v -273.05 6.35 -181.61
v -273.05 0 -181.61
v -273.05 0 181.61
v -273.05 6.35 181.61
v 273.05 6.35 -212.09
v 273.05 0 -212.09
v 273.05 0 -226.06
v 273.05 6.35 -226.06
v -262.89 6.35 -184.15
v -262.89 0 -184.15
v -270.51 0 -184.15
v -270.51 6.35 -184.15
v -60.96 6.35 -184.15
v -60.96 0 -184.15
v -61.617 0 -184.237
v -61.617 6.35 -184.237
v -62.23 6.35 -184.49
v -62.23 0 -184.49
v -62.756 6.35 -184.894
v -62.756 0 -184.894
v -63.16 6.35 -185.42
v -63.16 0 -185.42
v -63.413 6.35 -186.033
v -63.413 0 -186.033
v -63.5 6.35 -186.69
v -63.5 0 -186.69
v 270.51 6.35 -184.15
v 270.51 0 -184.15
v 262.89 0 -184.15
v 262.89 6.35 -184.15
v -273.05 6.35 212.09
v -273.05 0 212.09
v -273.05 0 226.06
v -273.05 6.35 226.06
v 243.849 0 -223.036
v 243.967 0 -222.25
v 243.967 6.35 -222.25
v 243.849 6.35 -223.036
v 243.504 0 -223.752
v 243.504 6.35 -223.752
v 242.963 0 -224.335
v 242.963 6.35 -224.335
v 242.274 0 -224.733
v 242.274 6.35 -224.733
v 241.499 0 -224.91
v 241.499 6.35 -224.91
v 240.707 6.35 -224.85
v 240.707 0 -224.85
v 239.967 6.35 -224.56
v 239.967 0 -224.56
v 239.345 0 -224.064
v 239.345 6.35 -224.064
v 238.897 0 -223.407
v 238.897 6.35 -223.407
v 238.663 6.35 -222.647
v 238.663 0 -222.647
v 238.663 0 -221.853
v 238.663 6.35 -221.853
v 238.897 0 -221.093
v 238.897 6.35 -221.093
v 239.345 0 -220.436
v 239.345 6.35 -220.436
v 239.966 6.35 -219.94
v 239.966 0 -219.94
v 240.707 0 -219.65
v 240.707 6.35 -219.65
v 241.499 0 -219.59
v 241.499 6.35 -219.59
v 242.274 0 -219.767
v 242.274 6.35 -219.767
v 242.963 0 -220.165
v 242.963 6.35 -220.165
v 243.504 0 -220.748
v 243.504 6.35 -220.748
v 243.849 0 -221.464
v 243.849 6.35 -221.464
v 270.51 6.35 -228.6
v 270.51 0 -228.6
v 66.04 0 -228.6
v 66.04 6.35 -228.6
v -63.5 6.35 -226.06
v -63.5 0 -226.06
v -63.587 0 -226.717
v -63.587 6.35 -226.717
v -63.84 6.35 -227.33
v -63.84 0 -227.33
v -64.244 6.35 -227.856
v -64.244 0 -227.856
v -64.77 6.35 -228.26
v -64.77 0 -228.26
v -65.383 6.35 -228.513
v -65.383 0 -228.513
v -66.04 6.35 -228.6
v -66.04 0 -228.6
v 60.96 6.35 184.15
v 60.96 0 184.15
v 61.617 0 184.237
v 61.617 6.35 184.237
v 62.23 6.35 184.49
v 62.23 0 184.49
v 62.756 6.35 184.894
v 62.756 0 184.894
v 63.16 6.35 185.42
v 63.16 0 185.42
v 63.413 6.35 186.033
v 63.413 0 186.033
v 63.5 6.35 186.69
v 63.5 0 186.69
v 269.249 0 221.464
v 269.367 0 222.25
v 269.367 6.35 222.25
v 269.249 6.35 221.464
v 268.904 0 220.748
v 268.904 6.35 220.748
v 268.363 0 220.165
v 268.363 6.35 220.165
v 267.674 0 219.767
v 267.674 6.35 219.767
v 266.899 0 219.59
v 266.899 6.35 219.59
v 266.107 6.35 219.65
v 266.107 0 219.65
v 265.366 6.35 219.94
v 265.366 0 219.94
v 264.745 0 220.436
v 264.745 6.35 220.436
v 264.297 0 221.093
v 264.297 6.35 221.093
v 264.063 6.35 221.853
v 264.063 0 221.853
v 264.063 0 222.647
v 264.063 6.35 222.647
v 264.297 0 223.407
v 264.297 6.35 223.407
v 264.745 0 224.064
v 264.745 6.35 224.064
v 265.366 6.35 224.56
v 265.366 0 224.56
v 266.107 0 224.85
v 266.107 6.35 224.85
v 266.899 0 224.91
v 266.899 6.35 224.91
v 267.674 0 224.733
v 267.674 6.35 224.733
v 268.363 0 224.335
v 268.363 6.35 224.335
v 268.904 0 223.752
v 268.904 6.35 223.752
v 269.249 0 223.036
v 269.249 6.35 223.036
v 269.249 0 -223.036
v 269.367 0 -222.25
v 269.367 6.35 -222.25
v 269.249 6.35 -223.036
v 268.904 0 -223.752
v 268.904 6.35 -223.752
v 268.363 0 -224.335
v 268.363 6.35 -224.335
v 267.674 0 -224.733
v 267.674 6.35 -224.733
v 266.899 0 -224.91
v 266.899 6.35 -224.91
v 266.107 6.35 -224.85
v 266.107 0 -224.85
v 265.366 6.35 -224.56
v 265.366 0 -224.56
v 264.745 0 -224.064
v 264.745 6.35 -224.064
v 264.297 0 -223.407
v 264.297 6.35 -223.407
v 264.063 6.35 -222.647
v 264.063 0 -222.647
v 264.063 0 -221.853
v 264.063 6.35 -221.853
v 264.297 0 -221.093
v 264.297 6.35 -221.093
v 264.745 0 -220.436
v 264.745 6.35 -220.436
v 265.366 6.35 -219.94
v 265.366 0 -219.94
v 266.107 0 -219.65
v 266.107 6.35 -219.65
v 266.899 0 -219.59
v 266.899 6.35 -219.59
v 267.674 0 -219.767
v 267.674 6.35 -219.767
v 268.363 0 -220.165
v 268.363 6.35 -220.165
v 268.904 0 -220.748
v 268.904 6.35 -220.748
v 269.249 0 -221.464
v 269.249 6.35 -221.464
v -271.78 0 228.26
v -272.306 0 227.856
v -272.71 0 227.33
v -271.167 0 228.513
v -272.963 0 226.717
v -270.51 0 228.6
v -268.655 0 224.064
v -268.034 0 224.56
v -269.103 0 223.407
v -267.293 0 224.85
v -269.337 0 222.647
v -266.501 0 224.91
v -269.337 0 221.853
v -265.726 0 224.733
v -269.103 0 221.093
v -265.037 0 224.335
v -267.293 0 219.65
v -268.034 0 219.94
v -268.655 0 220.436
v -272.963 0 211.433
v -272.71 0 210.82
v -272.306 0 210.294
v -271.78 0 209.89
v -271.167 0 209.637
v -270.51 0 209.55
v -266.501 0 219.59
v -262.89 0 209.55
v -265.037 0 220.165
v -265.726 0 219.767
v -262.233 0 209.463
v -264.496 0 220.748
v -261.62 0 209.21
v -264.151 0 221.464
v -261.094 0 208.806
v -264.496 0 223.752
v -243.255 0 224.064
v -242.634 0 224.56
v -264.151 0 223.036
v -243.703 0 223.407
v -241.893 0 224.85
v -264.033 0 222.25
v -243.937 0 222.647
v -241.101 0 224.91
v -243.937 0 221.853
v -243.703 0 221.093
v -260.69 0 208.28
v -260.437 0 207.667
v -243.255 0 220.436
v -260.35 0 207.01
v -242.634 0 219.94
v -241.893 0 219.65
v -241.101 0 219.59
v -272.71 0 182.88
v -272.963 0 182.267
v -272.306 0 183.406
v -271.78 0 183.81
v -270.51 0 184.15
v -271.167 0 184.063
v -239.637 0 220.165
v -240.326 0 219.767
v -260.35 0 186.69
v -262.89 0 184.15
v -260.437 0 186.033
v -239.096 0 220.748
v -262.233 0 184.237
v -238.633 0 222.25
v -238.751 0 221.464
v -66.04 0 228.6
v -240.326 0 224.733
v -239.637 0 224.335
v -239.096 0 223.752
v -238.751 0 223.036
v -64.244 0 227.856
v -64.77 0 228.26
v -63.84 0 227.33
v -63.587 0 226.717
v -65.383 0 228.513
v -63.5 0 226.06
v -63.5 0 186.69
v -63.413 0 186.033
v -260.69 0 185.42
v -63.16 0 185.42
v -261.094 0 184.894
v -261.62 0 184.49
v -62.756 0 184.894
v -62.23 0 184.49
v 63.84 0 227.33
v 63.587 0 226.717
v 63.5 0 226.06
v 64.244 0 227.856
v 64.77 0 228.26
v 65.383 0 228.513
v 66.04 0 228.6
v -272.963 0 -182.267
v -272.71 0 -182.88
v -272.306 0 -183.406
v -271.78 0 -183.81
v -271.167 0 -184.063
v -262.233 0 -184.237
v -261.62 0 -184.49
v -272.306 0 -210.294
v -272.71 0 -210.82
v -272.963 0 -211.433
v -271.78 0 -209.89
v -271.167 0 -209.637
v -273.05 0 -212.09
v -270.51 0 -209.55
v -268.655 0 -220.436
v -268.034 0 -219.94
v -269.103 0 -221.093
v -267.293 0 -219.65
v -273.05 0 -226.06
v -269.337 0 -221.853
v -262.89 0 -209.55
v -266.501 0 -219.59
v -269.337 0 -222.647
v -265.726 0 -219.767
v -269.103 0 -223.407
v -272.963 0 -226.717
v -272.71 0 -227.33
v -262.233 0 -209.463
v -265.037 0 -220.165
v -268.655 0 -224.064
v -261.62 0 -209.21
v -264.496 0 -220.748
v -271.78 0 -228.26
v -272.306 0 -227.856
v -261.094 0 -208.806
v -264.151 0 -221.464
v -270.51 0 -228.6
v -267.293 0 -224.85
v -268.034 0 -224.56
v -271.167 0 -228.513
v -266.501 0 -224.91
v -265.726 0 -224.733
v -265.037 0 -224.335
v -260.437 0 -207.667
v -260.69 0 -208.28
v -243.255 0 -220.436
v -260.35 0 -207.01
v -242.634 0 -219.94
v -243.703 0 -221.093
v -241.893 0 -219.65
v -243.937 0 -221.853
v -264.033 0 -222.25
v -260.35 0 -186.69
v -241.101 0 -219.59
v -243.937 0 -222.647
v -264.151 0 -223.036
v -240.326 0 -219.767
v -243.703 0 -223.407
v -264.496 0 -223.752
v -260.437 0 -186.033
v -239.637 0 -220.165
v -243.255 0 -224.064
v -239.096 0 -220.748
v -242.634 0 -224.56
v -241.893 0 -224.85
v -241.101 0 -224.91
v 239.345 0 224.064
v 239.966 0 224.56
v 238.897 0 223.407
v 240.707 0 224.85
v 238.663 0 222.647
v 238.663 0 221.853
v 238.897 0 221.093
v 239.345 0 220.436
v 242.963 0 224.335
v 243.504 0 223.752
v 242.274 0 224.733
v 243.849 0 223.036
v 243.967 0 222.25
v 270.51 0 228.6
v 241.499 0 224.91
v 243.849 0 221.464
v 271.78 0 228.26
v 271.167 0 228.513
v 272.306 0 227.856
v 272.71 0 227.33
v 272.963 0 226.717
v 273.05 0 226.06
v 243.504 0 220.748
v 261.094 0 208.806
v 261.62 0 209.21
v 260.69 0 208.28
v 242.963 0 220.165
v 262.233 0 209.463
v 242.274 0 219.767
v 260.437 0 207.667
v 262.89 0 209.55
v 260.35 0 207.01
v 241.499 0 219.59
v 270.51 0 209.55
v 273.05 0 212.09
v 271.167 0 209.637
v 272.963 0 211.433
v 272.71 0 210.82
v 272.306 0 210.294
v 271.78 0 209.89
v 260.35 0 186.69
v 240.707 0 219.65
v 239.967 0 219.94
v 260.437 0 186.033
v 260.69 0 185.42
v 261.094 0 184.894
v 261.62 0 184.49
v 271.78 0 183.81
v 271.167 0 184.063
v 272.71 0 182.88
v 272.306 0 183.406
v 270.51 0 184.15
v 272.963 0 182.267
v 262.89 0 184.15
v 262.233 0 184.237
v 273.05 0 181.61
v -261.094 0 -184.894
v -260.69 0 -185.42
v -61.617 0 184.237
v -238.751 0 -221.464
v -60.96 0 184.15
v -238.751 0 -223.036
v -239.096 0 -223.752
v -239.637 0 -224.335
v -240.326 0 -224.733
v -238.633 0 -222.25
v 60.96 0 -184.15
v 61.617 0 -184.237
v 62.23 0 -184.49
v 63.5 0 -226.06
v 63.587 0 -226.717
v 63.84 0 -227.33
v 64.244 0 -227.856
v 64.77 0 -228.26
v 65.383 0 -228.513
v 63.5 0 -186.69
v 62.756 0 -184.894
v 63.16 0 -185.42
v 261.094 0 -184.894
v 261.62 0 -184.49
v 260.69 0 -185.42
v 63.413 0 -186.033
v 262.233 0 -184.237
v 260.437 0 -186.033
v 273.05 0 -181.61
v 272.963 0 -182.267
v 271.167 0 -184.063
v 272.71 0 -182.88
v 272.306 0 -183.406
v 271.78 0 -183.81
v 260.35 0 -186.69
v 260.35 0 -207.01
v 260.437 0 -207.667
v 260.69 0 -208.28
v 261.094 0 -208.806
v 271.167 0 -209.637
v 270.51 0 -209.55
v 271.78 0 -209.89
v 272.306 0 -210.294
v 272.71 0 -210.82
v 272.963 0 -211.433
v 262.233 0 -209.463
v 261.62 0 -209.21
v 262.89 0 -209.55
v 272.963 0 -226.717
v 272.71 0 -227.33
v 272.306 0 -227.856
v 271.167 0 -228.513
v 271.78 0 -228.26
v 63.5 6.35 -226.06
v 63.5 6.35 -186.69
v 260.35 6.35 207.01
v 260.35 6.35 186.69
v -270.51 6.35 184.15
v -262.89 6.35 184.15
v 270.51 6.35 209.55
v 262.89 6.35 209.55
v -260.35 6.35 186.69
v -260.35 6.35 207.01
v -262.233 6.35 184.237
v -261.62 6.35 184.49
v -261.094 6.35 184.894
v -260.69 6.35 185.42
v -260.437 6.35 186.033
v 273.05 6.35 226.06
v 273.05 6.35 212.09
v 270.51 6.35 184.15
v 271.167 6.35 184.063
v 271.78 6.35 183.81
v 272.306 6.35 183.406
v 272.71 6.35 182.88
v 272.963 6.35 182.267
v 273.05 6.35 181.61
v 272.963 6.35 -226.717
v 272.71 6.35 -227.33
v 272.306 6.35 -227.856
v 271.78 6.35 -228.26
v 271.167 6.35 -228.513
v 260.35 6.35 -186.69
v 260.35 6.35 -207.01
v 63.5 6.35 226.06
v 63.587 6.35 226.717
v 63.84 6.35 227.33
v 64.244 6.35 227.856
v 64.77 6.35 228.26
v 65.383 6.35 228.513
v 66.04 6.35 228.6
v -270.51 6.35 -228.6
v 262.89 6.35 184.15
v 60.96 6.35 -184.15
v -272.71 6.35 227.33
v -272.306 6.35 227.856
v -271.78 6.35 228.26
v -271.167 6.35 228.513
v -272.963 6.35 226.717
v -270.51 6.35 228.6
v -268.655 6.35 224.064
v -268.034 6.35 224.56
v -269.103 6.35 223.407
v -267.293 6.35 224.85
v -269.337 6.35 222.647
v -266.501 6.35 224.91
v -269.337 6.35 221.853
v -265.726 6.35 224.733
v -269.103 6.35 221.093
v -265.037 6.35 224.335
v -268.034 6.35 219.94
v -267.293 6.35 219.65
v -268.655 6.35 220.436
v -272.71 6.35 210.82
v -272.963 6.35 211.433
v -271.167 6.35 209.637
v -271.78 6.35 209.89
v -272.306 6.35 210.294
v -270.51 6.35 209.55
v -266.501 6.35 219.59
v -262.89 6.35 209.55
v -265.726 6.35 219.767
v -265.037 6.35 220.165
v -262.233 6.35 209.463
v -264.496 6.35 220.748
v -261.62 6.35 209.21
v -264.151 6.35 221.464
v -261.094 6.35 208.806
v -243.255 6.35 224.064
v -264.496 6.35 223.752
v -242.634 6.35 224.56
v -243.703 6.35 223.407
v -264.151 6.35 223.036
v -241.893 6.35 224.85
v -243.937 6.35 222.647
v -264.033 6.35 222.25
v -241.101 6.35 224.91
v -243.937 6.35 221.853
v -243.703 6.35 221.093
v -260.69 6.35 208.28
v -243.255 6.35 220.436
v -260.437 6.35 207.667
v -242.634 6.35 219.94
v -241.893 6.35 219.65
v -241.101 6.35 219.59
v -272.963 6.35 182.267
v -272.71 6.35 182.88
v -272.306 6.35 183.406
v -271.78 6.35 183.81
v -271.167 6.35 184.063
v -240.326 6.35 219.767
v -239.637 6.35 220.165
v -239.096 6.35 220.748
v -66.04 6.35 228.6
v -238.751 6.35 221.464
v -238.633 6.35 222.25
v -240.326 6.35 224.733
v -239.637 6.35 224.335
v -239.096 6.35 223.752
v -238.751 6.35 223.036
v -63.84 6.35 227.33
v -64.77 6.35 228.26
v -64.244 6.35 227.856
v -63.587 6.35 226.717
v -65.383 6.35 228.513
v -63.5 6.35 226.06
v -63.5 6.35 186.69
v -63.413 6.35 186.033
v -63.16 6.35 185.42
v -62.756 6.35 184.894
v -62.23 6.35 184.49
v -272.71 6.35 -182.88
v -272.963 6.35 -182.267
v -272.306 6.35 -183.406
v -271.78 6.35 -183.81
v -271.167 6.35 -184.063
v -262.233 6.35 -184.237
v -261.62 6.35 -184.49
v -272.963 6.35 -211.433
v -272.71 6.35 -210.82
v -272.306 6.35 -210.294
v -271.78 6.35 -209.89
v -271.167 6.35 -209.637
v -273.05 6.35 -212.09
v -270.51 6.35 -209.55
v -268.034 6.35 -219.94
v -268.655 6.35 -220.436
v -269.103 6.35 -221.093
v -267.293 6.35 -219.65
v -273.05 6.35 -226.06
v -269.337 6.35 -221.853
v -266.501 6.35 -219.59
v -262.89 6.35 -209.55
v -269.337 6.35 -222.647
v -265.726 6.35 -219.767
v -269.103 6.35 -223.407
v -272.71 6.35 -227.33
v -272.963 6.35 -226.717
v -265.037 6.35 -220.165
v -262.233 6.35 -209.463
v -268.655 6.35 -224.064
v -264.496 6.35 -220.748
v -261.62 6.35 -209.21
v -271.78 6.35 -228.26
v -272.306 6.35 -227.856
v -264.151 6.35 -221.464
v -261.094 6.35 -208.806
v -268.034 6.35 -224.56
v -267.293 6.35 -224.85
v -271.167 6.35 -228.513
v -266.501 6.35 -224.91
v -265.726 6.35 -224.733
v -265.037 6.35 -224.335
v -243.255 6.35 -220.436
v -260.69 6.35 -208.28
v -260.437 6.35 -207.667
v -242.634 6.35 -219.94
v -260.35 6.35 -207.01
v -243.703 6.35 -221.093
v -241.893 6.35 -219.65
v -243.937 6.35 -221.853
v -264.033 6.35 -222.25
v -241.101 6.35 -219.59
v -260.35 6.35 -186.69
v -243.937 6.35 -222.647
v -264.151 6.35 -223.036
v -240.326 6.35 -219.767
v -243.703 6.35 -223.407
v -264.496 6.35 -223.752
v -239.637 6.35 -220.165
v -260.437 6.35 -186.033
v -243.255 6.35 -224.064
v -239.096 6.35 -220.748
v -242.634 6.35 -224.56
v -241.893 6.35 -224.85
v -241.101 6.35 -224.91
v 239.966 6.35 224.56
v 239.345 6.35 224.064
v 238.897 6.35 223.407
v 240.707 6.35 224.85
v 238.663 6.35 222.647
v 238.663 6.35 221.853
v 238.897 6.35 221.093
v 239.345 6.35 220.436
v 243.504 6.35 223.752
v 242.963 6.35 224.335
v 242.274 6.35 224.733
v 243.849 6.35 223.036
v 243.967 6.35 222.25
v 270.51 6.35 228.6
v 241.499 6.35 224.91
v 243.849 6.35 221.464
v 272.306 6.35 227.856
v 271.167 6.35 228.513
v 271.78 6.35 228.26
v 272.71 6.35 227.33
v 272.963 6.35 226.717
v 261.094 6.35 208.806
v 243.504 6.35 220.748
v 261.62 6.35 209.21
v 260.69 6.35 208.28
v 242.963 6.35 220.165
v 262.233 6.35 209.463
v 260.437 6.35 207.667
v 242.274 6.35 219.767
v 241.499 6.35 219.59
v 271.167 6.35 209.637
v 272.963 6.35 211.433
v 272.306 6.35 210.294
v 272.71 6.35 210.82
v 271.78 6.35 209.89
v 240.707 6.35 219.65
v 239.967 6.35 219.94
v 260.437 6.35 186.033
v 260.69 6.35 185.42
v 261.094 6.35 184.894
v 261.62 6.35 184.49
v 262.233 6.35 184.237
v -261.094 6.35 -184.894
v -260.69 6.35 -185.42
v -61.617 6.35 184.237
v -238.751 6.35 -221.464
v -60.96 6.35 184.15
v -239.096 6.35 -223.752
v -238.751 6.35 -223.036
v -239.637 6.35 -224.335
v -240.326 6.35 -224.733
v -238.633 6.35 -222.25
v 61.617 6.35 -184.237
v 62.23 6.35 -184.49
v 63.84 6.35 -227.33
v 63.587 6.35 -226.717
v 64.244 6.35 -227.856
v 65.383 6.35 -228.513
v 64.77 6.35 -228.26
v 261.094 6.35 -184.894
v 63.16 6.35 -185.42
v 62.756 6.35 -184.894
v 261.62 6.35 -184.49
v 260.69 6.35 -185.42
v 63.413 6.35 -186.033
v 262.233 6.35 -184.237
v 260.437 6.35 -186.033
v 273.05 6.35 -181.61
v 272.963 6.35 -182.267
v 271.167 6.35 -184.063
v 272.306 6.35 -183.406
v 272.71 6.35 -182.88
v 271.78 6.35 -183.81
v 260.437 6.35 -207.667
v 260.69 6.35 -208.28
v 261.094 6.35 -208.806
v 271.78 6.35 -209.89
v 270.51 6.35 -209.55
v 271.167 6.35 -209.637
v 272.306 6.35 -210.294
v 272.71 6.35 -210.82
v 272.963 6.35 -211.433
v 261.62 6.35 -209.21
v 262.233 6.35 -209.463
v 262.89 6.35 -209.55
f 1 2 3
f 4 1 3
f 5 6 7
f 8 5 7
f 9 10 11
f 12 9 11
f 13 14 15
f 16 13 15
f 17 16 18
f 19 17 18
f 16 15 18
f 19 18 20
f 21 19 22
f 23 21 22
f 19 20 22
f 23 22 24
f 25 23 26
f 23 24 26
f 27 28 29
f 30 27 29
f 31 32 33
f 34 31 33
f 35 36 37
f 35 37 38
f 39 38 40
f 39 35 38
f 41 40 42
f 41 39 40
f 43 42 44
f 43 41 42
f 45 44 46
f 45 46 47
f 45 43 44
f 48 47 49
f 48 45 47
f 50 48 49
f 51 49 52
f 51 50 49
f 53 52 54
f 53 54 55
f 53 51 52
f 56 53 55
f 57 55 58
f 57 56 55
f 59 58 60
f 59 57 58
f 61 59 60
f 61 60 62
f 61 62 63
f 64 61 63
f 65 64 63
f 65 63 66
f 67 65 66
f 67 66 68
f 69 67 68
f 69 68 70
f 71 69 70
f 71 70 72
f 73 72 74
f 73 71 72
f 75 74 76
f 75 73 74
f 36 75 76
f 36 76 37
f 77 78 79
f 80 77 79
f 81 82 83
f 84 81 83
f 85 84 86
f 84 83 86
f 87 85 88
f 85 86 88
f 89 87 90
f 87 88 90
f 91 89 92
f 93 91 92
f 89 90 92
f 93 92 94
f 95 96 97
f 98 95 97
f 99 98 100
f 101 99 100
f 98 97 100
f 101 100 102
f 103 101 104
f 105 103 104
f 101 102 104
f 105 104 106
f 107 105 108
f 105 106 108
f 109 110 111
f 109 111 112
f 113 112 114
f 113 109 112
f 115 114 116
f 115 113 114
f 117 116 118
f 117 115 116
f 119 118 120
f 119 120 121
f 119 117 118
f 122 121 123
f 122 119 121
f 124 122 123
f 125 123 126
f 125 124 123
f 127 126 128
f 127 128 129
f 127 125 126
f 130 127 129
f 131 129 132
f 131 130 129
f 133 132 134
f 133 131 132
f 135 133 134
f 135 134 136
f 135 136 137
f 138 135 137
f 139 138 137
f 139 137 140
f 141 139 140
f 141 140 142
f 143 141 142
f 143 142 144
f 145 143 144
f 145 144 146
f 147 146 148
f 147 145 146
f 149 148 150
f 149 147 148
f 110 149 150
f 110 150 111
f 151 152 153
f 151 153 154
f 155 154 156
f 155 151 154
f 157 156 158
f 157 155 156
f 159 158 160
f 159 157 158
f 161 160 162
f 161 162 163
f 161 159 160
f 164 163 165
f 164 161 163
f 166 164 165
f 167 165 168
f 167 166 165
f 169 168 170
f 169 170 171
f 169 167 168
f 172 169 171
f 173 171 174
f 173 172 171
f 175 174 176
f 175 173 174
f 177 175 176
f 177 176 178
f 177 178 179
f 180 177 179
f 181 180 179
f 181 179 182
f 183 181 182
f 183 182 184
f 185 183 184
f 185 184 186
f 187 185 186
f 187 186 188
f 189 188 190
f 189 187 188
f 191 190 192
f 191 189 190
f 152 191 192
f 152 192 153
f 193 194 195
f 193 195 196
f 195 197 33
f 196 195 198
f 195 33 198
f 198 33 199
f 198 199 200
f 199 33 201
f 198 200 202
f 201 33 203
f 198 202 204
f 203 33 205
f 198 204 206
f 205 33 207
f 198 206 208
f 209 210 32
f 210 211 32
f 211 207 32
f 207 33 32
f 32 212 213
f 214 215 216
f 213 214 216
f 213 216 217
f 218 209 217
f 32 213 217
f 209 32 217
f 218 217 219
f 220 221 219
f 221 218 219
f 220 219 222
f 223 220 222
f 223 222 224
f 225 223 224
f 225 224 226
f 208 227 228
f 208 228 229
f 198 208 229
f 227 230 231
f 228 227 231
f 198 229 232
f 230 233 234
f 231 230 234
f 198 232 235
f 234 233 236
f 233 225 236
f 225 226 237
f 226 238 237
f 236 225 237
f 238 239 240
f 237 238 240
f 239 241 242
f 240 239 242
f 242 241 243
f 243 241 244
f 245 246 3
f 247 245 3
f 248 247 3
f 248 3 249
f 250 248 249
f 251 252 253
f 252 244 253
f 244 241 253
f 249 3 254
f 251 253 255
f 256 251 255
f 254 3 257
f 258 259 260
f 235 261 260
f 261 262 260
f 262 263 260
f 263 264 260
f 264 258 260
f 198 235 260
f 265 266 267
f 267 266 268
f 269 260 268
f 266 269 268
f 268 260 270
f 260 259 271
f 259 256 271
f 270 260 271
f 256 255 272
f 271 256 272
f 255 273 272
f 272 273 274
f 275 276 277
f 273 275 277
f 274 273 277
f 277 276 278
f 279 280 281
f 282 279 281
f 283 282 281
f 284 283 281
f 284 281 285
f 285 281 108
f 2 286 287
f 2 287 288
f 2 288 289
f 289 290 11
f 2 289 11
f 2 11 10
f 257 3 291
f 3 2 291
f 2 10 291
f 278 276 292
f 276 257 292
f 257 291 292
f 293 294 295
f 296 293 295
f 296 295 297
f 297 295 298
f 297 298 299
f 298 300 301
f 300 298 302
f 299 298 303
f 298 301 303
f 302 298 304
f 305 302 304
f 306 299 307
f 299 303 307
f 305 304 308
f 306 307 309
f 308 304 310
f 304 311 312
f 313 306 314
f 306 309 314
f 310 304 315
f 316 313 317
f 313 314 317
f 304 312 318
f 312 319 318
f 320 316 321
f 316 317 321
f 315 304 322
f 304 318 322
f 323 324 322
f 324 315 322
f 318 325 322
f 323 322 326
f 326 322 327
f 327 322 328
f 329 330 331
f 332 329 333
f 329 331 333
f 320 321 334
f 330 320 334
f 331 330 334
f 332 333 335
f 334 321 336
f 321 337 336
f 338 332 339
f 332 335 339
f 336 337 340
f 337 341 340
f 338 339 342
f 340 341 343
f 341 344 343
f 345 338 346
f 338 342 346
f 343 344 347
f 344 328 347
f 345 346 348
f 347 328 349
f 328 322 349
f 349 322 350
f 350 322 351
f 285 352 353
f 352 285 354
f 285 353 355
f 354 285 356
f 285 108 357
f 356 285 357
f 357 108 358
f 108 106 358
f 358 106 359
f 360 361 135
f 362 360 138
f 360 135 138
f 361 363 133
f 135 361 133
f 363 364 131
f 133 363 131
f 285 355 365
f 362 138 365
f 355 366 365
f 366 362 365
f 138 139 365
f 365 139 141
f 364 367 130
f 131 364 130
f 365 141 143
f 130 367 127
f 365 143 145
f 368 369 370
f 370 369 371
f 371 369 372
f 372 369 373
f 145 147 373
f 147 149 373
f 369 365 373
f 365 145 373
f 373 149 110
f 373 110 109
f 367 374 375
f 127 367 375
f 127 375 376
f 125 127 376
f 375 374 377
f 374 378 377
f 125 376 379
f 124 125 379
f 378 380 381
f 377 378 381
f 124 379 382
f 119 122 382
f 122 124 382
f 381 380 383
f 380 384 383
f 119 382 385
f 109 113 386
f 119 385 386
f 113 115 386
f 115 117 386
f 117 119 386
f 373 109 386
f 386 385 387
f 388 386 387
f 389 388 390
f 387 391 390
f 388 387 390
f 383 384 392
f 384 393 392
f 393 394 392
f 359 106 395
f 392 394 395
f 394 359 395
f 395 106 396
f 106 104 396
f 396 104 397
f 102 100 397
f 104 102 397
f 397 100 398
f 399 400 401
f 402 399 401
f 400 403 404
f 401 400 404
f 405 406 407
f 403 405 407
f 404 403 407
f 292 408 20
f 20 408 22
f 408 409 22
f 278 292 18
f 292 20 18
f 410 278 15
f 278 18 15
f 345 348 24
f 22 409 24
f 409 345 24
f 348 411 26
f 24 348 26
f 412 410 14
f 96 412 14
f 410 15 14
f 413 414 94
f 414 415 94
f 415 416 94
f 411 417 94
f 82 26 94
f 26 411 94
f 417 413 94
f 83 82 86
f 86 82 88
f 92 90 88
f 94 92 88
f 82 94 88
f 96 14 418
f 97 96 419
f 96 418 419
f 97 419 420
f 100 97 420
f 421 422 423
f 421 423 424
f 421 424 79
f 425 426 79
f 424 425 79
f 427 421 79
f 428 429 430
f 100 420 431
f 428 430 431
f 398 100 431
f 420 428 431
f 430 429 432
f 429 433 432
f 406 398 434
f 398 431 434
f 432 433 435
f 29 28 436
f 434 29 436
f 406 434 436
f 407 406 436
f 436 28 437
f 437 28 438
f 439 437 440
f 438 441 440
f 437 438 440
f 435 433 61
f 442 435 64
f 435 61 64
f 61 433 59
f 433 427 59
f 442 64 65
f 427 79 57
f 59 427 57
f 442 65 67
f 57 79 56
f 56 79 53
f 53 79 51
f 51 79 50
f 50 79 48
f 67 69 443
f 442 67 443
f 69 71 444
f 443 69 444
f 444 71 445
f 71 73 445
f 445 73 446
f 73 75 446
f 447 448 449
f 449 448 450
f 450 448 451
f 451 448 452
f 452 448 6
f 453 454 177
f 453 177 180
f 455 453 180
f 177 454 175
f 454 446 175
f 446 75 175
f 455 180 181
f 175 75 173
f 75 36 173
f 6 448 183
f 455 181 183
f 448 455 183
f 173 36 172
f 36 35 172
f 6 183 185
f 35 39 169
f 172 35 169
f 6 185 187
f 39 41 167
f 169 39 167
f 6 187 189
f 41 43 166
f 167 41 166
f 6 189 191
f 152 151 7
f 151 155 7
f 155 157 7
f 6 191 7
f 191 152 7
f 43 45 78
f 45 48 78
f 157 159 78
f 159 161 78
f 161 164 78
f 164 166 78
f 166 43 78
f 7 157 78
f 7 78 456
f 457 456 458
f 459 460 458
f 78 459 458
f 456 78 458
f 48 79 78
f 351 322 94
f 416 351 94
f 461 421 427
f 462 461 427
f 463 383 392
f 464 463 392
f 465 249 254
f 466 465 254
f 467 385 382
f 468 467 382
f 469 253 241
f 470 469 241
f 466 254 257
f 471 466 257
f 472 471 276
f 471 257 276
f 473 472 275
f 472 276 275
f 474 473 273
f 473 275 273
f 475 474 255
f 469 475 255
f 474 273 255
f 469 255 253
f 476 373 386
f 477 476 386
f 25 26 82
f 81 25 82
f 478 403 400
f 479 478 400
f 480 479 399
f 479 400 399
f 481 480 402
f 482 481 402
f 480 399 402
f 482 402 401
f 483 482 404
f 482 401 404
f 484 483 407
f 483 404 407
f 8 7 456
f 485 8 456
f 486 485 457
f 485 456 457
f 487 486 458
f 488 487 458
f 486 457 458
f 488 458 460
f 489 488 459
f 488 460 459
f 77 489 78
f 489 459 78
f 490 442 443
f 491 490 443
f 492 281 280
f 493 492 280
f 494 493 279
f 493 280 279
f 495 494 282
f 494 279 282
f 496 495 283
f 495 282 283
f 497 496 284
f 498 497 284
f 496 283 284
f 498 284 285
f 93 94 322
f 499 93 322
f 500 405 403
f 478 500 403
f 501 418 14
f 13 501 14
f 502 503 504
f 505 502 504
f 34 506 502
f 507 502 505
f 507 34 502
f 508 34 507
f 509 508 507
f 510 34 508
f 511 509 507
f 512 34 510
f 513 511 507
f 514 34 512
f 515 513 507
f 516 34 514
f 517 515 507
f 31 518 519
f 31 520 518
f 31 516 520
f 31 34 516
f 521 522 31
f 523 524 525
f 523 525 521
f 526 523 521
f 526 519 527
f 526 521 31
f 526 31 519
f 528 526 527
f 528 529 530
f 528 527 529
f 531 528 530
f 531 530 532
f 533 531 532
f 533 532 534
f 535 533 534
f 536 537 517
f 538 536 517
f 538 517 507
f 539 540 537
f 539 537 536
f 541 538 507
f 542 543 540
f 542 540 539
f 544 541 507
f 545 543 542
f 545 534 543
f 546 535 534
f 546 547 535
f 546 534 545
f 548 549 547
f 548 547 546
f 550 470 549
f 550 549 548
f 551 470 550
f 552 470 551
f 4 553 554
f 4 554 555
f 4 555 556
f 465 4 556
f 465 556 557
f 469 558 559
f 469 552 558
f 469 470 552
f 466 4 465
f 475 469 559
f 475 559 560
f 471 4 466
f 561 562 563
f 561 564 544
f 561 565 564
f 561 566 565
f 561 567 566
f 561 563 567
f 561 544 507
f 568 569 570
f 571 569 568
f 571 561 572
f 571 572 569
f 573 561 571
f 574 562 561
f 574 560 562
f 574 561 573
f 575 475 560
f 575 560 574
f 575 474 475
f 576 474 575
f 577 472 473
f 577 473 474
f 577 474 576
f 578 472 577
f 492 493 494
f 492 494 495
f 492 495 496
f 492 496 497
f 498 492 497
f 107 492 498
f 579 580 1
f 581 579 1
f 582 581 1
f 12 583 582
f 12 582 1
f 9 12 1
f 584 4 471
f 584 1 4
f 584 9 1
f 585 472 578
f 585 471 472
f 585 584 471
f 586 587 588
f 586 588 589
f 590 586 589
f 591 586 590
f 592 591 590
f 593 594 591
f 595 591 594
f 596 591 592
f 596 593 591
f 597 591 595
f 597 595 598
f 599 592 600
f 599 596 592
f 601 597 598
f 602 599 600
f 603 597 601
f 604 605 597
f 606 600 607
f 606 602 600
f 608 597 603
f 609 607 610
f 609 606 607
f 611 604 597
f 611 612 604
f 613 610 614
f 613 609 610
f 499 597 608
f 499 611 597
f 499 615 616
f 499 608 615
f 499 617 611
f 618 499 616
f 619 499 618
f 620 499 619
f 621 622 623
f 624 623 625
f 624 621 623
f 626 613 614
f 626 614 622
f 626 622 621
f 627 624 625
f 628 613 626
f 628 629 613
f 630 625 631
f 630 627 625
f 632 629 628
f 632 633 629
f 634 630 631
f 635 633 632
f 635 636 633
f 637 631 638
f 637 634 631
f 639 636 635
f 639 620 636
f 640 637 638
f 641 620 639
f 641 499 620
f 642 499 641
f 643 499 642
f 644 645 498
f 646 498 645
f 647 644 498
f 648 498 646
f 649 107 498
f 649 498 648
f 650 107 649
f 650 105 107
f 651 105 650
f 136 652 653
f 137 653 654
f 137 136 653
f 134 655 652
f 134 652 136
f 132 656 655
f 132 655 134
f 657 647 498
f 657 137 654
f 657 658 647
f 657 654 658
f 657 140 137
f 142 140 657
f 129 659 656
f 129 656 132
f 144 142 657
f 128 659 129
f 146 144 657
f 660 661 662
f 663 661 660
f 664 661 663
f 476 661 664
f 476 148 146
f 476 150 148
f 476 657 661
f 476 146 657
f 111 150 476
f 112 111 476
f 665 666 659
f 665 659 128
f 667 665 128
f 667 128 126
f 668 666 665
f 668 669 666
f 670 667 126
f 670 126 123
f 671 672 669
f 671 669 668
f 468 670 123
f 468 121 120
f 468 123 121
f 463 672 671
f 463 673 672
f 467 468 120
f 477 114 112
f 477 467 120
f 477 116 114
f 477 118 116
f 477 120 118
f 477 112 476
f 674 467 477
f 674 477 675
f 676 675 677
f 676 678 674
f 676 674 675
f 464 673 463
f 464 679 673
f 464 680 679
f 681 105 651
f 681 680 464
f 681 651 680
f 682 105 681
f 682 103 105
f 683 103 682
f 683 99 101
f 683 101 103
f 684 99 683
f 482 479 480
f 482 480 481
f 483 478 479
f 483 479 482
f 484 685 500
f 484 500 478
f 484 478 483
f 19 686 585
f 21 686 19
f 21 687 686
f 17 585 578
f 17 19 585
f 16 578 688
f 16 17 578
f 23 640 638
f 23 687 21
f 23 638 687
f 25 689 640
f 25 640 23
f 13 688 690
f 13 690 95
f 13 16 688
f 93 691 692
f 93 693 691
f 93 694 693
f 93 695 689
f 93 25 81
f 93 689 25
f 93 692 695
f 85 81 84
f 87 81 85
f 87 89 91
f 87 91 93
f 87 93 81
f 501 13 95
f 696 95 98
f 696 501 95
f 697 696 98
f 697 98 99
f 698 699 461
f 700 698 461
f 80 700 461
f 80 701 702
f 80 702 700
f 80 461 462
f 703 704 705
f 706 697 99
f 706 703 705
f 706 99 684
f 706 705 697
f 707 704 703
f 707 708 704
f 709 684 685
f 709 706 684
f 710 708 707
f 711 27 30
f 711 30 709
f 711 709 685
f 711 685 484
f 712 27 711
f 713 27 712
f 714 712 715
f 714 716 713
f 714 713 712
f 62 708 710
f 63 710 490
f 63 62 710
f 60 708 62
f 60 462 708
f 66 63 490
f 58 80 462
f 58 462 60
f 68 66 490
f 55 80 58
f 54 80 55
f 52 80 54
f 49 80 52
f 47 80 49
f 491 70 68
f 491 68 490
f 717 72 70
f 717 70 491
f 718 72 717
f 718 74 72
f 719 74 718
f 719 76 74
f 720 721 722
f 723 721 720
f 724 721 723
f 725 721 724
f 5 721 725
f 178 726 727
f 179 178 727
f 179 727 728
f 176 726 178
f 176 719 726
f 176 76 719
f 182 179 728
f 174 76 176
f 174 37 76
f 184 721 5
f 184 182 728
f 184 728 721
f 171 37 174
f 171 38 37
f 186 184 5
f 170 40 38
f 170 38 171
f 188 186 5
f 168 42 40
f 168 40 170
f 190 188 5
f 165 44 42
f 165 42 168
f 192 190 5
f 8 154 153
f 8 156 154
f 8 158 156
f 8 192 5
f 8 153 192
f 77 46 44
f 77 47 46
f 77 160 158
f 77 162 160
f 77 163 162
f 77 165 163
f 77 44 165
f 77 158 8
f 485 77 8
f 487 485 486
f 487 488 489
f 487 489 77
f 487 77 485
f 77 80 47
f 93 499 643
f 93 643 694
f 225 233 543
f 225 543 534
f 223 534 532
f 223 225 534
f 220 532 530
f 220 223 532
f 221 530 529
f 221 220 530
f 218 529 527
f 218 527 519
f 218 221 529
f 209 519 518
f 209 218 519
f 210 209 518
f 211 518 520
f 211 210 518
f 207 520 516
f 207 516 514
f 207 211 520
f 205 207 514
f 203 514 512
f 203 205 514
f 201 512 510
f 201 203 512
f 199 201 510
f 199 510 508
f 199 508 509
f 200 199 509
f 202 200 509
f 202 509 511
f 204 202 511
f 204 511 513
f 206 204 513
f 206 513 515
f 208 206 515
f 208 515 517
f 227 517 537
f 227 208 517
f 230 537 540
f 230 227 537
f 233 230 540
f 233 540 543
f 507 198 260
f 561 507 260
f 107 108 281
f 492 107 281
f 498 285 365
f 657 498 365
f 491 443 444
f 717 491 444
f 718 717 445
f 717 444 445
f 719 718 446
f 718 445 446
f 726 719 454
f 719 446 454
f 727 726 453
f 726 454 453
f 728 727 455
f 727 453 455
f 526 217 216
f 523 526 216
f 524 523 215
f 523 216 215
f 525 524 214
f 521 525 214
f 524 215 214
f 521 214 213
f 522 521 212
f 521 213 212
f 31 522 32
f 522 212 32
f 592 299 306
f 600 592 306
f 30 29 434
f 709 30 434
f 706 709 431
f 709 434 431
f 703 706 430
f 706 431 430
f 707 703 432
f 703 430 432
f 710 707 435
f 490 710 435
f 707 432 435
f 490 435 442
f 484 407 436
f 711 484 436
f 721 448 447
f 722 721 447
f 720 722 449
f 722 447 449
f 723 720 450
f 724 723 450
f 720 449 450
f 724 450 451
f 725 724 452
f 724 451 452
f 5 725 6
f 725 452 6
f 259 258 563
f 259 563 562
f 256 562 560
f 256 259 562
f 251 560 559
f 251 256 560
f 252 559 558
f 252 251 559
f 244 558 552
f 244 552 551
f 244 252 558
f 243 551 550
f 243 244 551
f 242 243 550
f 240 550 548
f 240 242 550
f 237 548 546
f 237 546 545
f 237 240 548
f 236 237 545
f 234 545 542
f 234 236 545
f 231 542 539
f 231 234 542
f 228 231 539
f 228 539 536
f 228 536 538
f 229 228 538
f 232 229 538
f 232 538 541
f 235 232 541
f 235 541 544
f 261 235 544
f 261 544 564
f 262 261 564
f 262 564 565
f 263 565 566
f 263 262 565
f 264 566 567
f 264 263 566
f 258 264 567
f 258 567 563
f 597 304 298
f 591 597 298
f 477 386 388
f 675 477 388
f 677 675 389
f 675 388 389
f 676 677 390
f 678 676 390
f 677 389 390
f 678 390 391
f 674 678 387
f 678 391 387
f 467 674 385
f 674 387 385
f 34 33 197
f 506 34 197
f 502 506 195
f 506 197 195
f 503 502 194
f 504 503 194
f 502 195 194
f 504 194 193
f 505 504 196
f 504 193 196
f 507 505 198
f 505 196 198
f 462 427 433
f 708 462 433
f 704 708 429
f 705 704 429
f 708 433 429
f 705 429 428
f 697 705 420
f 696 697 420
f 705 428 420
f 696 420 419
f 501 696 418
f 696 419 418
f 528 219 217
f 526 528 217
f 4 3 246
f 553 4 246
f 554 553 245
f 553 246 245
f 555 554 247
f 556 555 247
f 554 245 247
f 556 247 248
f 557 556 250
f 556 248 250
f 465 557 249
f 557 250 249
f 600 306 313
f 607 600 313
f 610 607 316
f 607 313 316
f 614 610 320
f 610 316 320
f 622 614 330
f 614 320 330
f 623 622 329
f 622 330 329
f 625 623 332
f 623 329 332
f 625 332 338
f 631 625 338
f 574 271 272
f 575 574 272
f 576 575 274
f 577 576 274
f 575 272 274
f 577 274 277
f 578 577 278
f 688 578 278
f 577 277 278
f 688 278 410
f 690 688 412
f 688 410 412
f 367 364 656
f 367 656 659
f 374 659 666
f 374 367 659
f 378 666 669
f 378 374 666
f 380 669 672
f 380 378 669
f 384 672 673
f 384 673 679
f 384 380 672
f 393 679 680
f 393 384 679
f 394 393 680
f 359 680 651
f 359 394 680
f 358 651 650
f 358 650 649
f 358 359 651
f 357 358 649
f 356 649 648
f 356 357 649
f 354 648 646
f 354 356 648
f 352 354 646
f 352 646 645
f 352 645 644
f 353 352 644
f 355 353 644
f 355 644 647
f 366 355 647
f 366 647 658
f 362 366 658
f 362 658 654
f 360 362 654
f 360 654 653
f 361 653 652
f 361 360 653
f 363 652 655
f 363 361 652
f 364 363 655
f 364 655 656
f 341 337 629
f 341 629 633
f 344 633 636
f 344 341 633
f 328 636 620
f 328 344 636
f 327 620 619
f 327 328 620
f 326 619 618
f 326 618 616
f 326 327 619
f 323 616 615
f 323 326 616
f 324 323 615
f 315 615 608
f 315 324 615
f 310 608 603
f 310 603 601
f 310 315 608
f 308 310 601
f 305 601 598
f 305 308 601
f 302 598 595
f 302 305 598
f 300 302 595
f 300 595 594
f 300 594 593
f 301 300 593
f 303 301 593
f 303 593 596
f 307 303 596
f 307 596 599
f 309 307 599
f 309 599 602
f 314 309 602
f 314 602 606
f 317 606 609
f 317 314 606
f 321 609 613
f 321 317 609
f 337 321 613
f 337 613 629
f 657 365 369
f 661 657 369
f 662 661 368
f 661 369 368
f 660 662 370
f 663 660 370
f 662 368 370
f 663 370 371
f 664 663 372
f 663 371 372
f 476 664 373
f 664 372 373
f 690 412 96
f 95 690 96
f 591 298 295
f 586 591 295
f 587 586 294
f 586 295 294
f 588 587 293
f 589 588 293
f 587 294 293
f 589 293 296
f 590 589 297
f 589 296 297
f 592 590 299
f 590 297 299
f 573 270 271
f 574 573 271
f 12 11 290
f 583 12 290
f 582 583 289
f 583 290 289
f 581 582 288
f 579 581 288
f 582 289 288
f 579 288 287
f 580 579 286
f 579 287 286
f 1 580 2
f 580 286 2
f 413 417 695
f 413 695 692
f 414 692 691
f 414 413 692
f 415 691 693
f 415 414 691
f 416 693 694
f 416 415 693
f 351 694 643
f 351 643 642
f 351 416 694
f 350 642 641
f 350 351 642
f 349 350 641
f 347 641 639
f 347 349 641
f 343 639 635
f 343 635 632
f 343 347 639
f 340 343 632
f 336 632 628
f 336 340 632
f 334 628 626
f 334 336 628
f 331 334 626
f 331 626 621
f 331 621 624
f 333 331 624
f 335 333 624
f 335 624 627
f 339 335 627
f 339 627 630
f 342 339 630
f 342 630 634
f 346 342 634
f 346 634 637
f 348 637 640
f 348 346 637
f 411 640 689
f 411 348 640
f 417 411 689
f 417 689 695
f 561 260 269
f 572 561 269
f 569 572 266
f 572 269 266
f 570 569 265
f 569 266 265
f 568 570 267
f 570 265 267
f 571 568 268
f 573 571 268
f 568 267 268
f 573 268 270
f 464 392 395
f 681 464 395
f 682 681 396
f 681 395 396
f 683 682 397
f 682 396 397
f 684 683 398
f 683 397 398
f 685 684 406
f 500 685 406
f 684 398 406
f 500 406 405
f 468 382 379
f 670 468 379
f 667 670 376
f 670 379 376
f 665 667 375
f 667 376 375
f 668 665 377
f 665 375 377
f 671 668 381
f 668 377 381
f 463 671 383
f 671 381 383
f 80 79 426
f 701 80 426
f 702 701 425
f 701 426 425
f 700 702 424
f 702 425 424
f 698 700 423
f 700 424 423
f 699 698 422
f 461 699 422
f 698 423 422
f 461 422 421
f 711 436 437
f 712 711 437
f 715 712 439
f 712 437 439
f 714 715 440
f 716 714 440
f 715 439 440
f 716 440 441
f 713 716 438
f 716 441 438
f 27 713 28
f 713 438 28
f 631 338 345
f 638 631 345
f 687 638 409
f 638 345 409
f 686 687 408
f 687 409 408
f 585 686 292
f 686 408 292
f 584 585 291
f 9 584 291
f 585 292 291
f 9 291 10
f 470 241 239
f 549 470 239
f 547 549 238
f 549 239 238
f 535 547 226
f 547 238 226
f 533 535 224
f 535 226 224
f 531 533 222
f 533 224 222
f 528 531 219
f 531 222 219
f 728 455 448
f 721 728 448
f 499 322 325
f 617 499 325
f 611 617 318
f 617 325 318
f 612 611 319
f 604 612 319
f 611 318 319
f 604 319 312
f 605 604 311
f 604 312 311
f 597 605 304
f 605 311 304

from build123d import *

# Parameters (mm, degrees)
SKETCH1_R           = 2.667
BOSS_EXTRUDE1_DEPTH = 6.35


with BuildPart() as part:
    # Sketch1 → Boss-Extrude1 (new body)
    with BuildSketch(Plane(origin=(0, 0, 0), x_dir=(1, 0, 0), z_dir=(0, 1, 0))):
        with BuildLine():
            Line((-273.05, 226.06), (-273.05, 212.09))
            ThreePointArc((-273.05, 212.09), (-272.306051224, 210.293948776), (-270.51, 209.55))
            Line((-270.51, 209.55), (-262.89, 209.55))
            ThreePointArc((-262.89, 209.55), (-261.093948776, 208.806051224), (-260.35, 207.01))
            Line((-260.35, 207.01), (-260.35, 186.69))
            ThreePointArc((-260.35, 186.69), (-261.093948776, 184.893948776), (-262.89, 184.15))
            Line((-262.89, 184.15), (-270.51, 184.15))
            ThreePointArc((-270.51, 184.15), (-272.306051224, 183.406051224), (-273.05, 181.61))
            Line((-273.05, 181.61), (-273.05, -181.61))
            ThreePointArc((-273.05, -181.61), (-272.306051224, -183.406051224), (-270.51, -184.15))
            Line((-270.51, -184.15), (-262.89, -184.15))
            ThreePointArc((-262.89, -184.15), (-261.093948776, -184.893948776), (-260.35, -186.69))
            Line((-260.35, -186.69), (-260.35, -207.01))
            ThreePointArc((-260.35, -207.01), (-261.093948776, -208.806051224), (-262.89, -209.55))
            Line((-262.89, -209.55), (-270.51, -209.55))
            ThreePointArc((-270.51, -209.55), (-272.306051224, -210.293948776), (-273.05, -212.09))
            Line((-273.05, -212.09), (-273.05, -226.06))
            ThreePointArc((-273.05, -226.06), (-272.306051224, -227.856051224), (-270.51, -228.6))
            Line((-270.51, -228.6), (-66.04, -228.6))
            ThreePointArc((-66.04, -228.6), (-64.243948776, -227.856051224), (-63.5, -226.06))
            Line((-63.5, -226.06), (-63.5, -186.69))
            ThreePointArc((-63.5, -186.69), (-62.756051224, -184.893948776), (-60.96, -184.15))
            Line((-60.96, -184.15), (60.96, -184.15))
            ThreePointArc((60.96, -184.15), (62.756051224, -184.893948776), (63.5, -186.69))
            Line((63.5, -186.69), (63.5, -226.06))
            ThreePointArc((63.5, -226.06), (64.243948776, -227.856051224), (66.04, -228.6))
            Line((66.04, -228.6), (270.51, -228.6))
            ThreePointArc((270.51, -228.6), (272.306051224, -227.856051224), (273.05, -226.06))
            Line((273.05, -226.06), (273.05, -212.09))
            ThreePointArc((273.05, -212.09), (272.306051224, -210.293948776), (270.51, -209.55))
            Line((270.51, -209.55), (262.89, -209.55))
            ThreePointArc((262.89, -209.55), (261.093948776, -208.806051224), (260.35, -207.01))
            Line((260.35, -207.01), (260.35, -186.69))
            ThreePointArc((260.35, -186.69), (261.093948776, -184.893948776), (262.89, -184.15))
            Line((262.89, -184.15), (270.51, -184.15))
            ThreePointArc((270.51, -184.15), (272.306051224, -183.406051224), (273.05, -181.61))
            Line((273.05, -181.61), (273.05, 181.61))
            ThreePointArc((273.05, 181.61), (272.306051224, 183.406051224), (270.51, 184.15))
            Line((270.51, 184.15), (262.89, 184.15))
            ThreePointArc((262.89, 184.15), (261.093948776, 184.893948776), (260.35, 186.69))
            Line((260.35, 186.69), (260.35, 207.01))
            ThreePointArc((260.35, 207.01), (261.093948776, 208.806051224), (262.89, 209.55))
            Line((262.89, 209.55), (270.51, 209.55))
            ThreePointArc((270.51, 209.55), (272.306051224, 210.293948776), (273.05, 212.09))
            Line((273.05, 212.09), (273.05, 226.06))
            ThreePointArc((273.05, 226.06), (272.306051224, 227.856051224), (270.51, 228.6))
            Line((270.51, 228.6), (66.04, 228.6))
            ThreePointArc((66.04, 228.6), (64.243948776, 227.856051224), (63.5, 226.06))
            Line((63.5, 226.06), (63.5, 186.69))
            ThreePointArc((63.5, 186.69), (62.756051224, 184.893948776), (60.96, 184.15))
            Line((60.96, 184.15), (-60.96, 184.15))
            ThreePointArc((-60.96, 184.15), (-62.756051224, 184.893948776), (-63.5, 186.69))
            Line((-63.5, 186.69), (-63.5, 226.06))
            ThreePointArc((-63.5, 226.06), (-64.243948776, 227.856051224), (-66.04, 228.6))
            Line((-66.04, 228.6), (-270.51, 228.6))
            ThreePointArc((-270.51, 228.6), (-272.306051224, 227.856051224), (-273.05, 226.06))
        make_face()
        with Locations((-266.7, 222.25)):
            Circle(SKETCH1_R, mode=Mode.SUBTRACT)
        with Locations((266.7, 222.25)):
            Circle(SKETCH1_R, mode=Mode.SUBTRACT)
        with Locations((-241.3, 222.25)):
            Circle(SKETCH1_R, mode=Mode.SUBTRACT)
        with Locations((241.3, 222.25)):
            Circle(SKETCH1_R, mode=Mode.SUBTRACT)
        with Locations((-266.7, -222.25)):
            Circle(SKETCH1_R, mode=Mode.SUBTRACT)
        with Locations((266.7, -222.25)):
            Circle(SKETCH1_R, mode=Mode.SUBTRACT)
        with Locations((-241.3, -222.25)):
            Circle(SKETCH1_R, mode=Mode.SUBTRACT)
        with Locations((241.3, -222.25)):
            Circle(SKETCH1_R, mode=Mode.SUBTRACT)
    extrude(amount=BOSS_EXTRUDE1_DEPTH)


solid = part.part
